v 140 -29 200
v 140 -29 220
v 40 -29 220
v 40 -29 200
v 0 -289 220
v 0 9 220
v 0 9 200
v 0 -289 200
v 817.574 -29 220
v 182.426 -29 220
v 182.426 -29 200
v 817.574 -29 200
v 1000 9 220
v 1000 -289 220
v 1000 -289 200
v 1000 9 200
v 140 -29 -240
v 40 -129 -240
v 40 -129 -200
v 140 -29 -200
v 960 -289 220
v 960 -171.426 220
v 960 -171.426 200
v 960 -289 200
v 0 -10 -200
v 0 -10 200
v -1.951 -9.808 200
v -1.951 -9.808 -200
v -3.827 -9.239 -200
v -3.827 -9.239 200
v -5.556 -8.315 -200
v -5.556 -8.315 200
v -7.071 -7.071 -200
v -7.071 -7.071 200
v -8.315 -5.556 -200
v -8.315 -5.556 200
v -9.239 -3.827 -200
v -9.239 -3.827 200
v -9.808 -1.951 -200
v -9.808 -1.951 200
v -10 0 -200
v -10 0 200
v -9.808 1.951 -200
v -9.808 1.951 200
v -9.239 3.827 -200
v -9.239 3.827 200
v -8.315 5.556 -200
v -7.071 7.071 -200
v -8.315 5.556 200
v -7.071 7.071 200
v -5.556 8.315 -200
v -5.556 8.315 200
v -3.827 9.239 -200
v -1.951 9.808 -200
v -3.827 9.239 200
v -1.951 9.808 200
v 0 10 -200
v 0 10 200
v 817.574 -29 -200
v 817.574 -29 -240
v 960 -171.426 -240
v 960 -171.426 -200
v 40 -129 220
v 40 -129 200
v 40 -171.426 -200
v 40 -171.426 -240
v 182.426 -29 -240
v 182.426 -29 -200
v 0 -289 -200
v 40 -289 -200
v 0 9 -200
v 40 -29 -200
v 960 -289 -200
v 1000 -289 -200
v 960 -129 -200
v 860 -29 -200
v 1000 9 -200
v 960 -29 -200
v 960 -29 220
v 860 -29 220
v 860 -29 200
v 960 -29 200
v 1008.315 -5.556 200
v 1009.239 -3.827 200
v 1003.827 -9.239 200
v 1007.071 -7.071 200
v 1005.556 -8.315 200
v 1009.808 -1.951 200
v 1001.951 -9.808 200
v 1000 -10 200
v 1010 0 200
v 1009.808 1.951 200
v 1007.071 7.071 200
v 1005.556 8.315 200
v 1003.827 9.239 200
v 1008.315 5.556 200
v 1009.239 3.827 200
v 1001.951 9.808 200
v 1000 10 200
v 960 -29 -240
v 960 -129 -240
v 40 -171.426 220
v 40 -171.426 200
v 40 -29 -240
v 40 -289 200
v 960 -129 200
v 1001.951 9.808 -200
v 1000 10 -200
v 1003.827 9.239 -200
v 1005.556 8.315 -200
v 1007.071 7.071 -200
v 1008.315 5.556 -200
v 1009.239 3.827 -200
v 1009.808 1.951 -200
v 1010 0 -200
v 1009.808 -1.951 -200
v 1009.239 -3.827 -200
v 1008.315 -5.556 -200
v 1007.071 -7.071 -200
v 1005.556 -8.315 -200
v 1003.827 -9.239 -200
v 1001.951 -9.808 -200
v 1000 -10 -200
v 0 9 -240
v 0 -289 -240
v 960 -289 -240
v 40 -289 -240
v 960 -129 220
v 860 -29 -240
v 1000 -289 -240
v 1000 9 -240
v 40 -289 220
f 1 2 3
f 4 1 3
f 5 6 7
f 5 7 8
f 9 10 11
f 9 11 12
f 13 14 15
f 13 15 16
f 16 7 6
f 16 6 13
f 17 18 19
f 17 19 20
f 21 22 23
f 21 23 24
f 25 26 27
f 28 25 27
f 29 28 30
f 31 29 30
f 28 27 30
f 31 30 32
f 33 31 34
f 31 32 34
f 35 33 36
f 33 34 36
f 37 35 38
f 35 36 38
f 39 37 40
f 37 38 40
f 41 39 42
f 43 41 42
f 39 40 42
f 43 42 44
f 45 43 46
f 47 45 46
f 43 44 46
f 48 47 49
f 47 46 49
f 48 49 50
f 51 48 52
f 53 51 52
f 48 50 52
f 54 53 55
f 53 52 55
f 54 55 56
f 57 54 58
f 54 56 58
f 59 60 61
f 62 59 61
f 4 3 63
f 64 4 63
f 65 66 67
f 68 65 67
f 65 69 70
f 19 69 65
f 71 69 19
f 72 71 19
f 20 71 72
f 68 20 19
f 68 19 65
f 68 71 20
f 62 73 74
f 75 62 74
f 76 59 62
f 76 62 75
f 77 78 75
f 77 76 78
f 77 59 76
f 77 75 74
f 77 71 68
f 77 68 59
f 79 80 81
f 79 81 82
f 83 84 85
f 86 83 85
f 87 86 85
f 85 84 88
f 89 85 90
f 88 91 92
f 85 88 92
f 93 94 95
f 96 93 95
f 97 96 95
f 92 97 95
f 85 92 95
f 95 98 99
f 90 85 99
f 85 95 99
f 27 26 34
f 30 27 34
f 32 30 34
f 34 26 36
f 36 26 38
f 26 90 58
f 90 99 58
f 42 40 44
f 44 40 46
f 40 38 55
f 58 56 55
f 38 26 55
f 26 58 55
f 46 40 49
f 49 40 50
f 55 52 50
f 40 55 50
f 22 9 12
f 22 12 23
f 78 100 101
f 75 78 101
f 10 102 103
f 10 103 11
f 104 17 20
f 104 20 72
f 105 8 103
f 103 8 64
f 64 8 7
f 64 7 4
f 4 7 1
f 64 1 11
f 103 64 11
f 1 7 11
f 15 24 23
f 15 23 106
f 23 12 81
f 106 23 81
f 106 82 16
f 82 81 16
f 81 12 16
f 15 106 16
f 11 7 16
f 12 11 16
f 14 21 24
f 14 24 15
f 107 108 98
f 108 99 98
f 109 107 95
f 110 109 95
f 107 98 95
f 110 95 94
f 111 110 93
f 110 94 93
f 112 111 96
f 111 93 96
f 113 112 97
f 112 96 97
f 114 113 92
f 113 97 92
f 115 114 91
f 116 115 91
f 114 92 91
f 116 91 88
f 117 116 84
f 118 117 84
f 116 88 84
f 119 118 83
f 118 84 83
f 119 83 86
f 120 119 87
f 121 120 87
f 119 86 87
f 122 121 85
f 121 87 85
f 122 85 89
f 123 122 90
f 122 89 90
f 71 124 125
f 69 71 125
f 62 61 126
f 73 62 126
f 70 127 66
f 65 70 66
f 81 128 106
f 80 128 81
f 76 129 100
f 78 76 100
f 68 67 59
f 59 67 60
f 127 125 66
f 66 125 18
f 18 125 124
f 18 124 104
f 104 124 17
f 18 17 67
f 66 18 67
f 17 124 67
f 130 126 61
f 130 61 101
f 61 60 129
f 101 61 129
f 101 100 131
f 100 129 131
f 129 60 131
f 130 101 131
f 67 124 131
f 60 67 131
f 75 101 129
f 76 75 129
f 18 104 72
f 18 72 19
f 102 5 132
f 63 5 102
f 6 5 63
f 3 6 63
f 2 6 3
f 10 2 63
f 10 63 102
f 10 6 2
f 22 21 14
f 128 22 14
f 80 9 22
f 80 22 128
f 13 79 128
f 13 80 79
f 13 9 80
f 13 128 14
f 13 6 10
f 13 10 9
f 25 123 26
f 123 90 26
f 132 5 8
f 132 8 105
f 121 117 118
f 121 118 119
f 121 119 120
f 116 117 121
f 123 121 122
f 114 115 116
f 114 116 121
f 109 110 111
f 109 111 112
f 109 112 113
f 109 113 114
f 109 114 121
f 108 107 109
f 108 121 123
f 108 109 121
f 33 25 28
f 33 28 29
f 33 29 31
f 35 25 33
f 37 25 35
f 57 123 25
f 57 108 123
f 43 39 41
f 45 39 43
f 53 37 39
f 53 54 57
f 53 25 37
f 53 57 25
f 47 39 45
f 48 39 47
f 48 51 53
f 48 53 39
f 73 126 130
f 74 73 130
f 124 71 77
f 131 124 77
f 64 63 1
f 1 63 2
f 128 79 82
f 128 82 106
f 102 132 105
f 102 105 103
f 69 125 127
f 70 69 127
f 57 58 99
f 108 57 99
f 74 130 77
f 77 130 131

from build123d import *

# Parameters (mm, degrees)
EXTRUDE_1_DEPTH = 200
SKETCH_2_W      = 1000
SKETCH_2_H      = 18
EXTRUDE_2_DEPTH = 20
EXTRUDE_3_DEPTH = 20
EXTRUDE_START   = -400
SKETCH_2_2_W    = 1000
SKETCH_2_2_H    = 18
EXTRUDE_4_DEPTH = 40
EXTRUDE_START_2 = -460
EXTRUDE_5_DEPTH = 40


with BuildPart() as part:
    # 草图1 → 凸台-拉伸1 (new, symmetric)
    with BuildSketch(Plane.XY):
        with BuildLine():
            Line((0, 10), (1000, 10))
            ThreePointArc((1000, 10), (1010, 0), (1000, -10))
            Line((1000, -10), (0, -10))
            ThreePointArc((0, -10), (-10, 0), (0, 10))
        make_face()
    extrude(amount=EXTRUDE_1_DEPTH, both=True)


with BuildPart() as body_2:
    # 草图2 → 凸台-拉伸2 (new body)
    with BuildSketch(Plane.XY.offset(200)):
        with Locations((500, 0)):
            Rectangle(SKETCH_2_W, SKETCH_2_H)
    extrude(amount=EXTRUDE_2_DEPTH)

    # 草图3 → 凸台-拉伸3 (add)
    with BuildSketch(Plane.XY.offset(220)):
        Polygon((0, -9), (0, -289), (40, -289), (40, -171.426406871), (182.426406871, -29), (817.573593129, -29), (960, -171.426406871), (960, -289), (1000, -289), (1000, -9), align=None)
        Polygon((40, -29), (40, -129), (140, -29), align=None, mode=Mode.SUBTRACT)
        Polygon((960, -129), (860, -29), (960, -29), align=None, mode=Mode.SUBTRACT)
    extrude(amount=-EXTRUDE_3_DEPTH)


with BuildPart() as body_3:
    # 草图2<2> → 凸台-拉伸4 (new body)
    with BuildSketch(Plane.XY.offset(200).offset(EXTRUDE_START)):
        with Locations((500, 0)):
            Rectangle(SKETCH_2_2_W, SKETCH_2_2_H)
    extrude(amount=-EXTRUDE_4_DEPTH)

    # 草图3<2> → 凸台-拉伸5 (add)
    with BuildSketch(Plane.XY.offset(220).offset(EXTRUDE_START_2)):
        Polygon((0, -9), (0, -289), (40, -289), (40, -171.426406871), (182.426406871, -29), (817.573593129, -29), (960, -171.426406871), (960, -289), (1000, -289), (1000, -9), align=None)
        Polygon((40, -29), (40, -129), (140, -29), align=None, mode=Mode.SUBTRACT)
        Polygon((960, -129), (860, -29), (960, -29), align=None, mode=Mode.SUBTRACT)
    extrude(amount=EXTRUDE_5_DEPTH)


solid = Compound([part.part, body_2.part, body_3.part])
